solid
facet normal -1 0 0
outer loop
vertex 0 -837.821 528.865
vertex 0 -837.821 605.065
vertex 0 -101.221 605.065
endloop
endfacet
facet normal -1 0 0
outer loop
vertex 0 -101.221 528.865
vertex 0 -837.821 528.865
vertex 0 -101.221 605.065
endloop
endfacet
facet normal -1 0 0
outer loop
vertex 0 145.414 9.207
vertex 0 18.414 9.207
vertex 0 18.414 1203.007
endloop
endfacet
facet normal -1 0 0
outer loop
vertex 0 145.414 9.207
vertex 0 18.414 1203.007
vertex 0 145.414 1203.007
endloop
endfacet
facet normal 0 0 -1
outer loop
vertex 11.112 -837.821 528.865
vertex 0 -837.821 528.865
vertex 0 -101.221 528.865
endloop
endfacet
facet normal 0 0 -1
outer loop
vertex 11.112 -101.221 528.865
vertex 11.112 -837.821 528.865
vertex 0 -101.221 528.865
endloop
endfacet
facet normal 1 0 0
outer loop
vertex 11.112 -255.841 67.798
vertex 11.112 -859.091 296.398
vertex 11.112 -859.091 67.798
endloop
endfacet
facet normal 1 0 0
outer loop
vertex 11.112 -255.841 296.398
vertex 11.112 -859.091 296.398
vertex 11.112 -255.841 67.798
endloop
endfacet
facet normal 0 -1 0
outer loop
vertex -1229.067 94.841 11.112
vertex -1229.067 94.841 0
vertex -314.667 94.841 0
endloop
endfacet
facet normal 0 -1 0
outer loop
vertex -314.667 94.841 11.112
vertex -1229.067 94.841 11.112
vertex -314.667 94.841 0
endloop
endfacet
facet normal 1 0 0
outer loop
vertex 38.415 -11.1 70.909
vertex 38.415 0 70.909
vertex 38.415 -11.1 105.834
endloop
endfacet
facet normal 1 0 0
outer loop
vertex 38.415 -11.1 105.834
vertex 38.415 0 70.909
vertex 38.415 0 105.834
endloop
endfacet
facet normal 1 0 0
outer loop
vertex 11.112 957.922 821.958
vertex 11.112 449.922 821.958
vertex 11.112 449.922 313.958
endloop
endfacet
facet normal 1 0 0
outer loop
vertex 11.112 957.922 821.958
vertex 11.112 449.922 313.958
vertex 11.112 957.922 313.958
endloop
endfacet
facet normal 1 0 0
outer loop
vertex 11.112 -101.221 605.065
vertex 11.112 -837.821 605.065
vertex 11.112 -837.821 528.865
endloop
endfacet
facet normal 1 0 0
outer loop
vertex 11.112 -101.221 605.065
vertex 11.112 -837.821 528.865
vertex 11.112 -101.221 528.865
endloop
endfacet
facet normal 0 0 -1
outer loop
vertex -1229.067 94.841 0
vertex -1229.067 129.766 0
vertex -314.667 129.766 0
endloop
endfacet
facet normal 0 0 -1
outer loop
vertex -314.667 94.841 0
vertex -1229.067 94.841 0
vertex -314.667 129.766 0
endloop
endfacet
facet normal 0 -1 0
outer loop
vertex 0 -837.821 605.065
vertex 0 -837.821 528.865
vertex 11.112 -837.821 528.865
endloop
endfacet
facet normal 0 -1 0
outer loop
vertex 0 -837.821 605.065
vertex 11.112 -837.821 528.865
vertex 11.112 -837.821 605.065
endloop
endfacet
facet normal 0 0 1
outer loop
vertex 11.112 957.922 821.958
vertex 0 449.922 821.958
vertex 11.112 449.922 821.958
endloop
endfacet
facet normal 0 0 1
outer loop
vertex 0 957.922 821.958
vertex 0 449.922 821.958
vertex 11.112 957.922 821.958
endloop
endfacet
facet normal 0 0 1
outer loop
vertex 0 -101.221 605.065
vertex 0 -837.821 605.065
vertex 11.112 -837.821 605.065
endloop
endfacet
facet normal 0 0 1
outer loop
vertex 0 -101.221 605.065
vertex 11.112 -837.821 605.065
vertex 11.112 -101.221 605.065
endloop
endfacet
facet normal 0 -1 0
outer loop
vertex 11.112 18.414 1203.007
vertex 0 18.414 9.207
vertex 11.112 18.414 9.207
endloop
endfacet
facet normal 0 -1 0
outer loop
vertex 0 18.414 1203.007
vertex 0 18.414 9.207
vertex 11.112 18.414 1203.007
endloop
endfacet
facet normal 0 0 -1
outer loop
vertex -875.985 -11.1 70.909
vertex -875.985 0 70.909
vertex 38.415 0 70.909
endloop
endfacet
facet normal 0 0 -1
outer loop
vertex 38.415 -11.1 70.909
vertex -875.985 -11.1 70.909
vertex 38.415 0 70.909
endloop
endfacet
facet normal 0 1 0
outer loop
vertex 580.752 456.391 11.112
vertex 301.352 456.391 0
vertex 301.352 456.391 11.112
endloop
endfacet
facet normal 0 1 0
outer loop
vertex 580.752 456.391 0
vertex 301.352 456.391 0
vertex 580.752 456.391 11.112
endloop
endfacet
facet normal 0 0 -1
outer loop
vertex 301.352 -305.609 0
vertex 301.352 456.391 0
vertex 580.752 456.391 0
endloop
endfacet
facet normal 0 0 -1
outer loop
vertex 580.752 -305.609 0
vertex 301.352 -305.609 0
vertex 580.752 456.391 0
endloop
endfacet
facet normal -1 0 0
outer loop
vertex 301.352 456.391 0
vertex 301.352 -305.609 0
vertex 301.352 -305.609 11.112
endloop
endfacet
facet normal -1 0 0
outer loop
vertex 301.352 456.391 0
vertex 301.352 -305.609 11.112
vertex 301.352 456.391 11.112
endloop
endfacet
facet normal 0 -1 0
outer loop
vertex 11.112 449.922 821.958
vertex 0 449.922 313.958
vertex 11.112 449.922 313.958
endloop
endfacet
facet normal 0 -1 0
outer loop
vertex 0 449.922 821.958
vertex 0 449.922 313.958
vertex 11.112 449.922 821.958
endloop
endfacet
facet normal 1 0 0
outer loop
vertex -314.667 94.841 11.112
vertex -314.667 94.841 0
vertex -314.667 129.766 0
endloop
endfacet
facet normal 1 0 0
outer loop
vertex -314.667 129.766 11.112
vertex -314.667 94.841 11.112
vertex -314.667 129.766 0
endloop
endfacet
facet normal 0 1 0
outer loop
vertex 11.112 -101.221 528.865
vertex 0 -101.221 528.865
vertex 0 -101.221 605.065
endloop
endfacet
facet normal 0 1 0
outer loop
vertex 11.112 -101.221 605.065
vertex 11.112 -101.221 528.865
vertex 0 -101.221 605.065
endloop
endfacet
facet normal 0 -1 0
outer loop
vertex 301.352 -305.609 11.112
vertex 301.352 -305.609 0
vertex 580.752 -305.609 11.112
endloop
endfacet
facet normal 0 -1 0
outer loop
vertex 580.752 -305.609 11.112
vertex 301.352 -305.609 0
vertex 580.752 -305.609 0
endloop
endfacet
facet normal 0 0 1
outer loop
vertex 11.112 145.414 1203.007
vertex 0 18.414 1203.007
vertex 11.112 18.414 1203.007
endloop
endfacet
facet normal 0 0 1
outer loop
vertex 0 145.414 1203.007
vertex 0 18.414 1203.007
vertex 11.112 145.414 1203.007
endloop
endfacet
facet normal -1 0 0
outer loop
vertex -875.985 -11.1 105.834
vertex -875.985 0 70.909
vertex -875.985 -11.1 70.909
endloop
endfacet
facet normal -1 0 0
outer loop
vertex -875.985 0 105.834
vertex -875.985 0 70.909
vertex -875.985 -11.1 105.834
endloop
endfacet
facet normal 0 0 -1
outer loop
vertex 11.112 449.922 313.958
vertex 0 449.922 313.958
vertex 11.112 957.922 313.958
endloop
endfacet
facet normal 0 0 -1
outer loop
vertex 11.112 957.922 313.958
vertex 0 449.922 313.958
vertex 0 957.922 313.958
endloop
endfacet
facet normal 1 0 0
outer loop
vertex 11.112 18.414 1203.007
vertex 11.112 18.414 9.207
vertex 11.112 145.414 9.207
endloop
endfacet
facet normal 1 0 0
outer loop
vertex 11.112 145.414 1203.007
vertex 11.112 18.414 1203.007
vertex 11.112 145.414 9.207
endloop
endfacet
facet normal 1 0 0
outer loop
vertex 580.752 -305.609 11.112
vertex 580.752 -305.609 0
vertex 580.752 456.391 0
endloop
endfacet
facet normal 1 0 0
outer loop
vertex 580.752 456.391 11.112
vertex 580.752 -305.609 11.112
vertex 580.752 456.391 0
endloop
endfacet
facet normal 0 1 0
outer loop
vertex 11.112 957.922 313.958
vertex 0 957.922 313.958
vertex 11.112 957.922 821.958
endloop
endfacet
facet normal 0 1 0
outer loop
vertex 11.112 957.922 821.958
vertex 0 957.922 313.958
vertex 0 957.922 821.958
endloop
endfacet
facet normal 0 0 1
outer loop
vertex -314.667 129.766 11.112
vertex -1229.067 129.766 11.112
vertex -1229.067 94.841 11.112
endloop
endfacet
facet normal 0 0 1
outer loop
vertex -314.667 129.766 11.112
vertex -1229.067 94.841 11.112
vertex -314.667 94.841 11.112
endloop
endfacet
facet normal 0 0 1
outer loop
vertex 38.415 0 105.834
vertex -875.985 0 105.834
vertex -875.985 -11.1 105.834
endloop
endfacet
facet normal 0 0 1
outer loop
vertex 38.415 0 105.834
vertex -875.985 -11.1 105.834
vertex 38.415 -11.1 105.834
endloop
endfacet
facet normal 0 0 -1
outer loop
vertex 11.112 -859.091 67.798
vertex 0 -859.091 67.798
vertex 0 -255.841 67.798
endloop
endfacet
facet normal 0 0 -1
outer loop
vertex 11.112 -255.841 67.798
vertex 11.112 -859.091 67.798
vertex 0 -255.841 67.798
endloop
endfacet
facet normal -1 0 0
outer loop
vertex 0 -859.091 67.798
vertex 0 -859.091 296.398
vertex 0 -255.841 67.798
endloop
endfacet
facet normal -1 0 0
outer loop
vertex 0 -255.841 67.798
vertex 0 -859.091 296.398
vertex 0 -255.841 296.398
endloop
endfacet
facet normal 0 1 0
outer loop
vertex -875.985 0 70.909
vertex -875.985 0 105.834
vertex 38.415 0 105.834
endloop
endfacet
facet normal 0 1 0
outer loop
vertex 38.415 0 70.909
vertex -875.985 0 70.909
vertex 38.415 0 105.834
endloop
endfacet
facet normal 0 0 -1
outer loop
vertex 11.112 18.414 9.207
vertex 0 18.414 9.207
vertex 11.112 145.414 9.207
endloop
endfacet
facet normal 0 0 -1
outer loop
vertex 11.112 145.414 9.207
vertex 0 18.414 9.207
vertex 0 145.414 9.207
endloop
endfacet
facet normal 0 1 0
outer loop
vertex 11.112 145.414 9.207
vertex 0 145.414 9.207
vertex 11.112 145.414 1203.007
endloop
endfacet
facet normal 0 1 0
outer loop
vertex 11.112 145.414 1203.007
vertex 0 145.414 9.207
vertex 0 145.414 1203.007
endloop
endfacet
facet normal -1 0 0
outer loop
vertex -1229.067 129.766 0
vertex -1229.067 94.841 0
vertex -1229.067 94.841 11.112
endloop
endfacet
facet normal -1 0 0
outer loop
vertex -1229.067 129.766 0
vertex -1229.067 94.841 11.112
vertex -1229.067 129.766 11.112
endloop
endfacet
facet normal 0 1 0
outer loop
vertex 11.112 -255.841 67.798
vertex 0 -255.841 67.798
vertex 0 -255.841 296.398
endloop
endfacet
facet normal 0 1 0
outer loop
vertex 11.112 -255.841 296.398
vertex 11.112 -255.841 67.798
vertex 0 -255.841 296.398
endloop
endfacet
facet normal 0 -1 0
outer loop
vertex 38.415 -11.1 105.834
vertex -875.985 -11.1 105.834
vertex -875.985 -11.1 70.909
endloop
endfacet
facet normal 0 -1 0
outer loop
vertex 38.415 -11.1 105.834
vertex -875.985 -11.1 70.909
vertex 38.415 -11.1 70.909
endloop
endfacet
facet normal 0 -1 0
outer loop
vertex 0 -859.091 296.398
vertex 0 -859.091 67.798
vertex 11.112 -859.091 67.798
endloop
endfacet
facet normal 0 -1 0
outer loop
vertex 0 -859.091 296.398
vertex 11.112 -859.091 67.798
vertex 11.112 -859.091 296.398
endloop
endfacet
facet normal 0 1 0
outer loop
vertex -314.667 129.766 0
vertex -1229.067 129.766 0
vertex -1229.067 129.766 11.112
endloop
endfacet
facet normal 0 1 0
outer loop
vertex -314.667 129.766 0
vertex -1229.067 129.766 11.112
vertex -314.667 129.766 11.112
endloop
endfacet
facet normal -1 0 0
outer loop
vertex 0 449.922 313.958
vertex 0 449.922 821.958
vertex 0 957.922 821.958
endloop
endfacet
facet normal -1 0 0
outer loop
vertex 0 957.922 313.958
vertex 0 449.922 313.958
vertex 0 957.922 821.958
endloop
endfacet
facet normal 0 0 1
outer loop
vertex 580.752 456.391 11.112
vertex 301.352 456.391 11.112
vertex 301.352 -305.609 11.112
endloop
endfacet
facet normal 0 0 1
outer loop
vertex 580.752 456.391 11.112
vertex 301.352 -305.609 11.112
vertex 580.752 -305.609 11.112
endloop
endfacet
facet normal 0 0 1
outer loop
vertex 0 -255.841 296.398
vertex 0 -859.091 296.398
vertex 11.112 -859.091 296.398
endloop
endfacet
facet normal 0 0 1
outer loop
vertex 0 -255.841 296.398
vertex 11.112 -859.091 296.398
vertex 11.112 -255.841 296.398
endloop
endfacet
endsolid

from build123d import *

# Parameters (mm, degrees)
F0_W      = 127
F0_H      = 1193.8
F1_DEPTH  = 11.1125
F2_W      = 603.25
F2_H      = 228.6
F3_DEPTH  = 11.1125
F4_W      = 736.6
F4_H      = 76.2
F5_DEPTH  = 11.1125
F6_W      = 279.4
F6_H      = 762
F7_DEPTH  = 11.1125
F8_W      = 508
F8_H      = 508
F9_DEPTH  = 11.1125
F10_W     = 914.4
F10_H     = 34.925
F11_DEPTH = 11.0998
F12_W     = 914.4
F12_H     = 34.925
F13_DEPTH = 11.1125


with BuildPart() as f1:
    # F0 (on Right) → F1 (new body)
    with BuildSketch(Plane.YZ):
        with Locations((81.913734, 606.106866)):
            Rectangle(F0_W, F0_H)
    extrude(amount=F1_DEPTH)


with BuildPart() as f3:
    # F2 (on Right) → F3 (new body)
    with BuildSketch(Plane.YZ):
        with Locations((-557.466345, 182.097936)):
            Rectangle(F2_W, F2_H)
    extrude(amount=F3_DEPTH)


with BuildPart() as f5:
    # F4 (on Right) → F5 (new body)
    with BuildSketch(Plane.YZ):
        with Locations((-469.52059, 566.964861)):
            Rectangle(F4_W, F4_H)
    extrude(amount=F5_DEPTH)


with BuildPart() as f7:
    # F6 (on Top) → F7 (new body)
    with BuildSketch(Plane.XY):
        with Locations((441.051517, 75.390953)):
            Rectangle(F6_W, F6_H)
    extrude(amount=F7_DEPTH)


with BuildPart() as f9:
    # F8 (on Right) → F9 (new body)
    with BuildSketch(Plane.YZ):
        with Locations((703.921897, 567.958079)):
            Rectangle(F8_W, F8_H)
    extrude(amount=F9_DEPTH)


with BuildPart() as f11:
    # F10 (on Front) → F11 (new body)
    with BuildSketch(Plane.XZ):
        with Locations((-418.784669, 88.371277)):
            Rectangle(F10_W, F10_H)
    extrude(amount=F11_DEPTH)


with BuildPart() as f13:
    # F12 (on Top) → F13 (new body)
    with BuildSketch(Plane.XY):
        with Locations((-771.867216, 112.303123)):
            Rectangle(F12_W, F12_H)
    extrude(amount=F13_DEPTH)


solid = Compound([f1.part, f3.part, f5.part, f7.part, f9.part, f11.part, f13.part])
